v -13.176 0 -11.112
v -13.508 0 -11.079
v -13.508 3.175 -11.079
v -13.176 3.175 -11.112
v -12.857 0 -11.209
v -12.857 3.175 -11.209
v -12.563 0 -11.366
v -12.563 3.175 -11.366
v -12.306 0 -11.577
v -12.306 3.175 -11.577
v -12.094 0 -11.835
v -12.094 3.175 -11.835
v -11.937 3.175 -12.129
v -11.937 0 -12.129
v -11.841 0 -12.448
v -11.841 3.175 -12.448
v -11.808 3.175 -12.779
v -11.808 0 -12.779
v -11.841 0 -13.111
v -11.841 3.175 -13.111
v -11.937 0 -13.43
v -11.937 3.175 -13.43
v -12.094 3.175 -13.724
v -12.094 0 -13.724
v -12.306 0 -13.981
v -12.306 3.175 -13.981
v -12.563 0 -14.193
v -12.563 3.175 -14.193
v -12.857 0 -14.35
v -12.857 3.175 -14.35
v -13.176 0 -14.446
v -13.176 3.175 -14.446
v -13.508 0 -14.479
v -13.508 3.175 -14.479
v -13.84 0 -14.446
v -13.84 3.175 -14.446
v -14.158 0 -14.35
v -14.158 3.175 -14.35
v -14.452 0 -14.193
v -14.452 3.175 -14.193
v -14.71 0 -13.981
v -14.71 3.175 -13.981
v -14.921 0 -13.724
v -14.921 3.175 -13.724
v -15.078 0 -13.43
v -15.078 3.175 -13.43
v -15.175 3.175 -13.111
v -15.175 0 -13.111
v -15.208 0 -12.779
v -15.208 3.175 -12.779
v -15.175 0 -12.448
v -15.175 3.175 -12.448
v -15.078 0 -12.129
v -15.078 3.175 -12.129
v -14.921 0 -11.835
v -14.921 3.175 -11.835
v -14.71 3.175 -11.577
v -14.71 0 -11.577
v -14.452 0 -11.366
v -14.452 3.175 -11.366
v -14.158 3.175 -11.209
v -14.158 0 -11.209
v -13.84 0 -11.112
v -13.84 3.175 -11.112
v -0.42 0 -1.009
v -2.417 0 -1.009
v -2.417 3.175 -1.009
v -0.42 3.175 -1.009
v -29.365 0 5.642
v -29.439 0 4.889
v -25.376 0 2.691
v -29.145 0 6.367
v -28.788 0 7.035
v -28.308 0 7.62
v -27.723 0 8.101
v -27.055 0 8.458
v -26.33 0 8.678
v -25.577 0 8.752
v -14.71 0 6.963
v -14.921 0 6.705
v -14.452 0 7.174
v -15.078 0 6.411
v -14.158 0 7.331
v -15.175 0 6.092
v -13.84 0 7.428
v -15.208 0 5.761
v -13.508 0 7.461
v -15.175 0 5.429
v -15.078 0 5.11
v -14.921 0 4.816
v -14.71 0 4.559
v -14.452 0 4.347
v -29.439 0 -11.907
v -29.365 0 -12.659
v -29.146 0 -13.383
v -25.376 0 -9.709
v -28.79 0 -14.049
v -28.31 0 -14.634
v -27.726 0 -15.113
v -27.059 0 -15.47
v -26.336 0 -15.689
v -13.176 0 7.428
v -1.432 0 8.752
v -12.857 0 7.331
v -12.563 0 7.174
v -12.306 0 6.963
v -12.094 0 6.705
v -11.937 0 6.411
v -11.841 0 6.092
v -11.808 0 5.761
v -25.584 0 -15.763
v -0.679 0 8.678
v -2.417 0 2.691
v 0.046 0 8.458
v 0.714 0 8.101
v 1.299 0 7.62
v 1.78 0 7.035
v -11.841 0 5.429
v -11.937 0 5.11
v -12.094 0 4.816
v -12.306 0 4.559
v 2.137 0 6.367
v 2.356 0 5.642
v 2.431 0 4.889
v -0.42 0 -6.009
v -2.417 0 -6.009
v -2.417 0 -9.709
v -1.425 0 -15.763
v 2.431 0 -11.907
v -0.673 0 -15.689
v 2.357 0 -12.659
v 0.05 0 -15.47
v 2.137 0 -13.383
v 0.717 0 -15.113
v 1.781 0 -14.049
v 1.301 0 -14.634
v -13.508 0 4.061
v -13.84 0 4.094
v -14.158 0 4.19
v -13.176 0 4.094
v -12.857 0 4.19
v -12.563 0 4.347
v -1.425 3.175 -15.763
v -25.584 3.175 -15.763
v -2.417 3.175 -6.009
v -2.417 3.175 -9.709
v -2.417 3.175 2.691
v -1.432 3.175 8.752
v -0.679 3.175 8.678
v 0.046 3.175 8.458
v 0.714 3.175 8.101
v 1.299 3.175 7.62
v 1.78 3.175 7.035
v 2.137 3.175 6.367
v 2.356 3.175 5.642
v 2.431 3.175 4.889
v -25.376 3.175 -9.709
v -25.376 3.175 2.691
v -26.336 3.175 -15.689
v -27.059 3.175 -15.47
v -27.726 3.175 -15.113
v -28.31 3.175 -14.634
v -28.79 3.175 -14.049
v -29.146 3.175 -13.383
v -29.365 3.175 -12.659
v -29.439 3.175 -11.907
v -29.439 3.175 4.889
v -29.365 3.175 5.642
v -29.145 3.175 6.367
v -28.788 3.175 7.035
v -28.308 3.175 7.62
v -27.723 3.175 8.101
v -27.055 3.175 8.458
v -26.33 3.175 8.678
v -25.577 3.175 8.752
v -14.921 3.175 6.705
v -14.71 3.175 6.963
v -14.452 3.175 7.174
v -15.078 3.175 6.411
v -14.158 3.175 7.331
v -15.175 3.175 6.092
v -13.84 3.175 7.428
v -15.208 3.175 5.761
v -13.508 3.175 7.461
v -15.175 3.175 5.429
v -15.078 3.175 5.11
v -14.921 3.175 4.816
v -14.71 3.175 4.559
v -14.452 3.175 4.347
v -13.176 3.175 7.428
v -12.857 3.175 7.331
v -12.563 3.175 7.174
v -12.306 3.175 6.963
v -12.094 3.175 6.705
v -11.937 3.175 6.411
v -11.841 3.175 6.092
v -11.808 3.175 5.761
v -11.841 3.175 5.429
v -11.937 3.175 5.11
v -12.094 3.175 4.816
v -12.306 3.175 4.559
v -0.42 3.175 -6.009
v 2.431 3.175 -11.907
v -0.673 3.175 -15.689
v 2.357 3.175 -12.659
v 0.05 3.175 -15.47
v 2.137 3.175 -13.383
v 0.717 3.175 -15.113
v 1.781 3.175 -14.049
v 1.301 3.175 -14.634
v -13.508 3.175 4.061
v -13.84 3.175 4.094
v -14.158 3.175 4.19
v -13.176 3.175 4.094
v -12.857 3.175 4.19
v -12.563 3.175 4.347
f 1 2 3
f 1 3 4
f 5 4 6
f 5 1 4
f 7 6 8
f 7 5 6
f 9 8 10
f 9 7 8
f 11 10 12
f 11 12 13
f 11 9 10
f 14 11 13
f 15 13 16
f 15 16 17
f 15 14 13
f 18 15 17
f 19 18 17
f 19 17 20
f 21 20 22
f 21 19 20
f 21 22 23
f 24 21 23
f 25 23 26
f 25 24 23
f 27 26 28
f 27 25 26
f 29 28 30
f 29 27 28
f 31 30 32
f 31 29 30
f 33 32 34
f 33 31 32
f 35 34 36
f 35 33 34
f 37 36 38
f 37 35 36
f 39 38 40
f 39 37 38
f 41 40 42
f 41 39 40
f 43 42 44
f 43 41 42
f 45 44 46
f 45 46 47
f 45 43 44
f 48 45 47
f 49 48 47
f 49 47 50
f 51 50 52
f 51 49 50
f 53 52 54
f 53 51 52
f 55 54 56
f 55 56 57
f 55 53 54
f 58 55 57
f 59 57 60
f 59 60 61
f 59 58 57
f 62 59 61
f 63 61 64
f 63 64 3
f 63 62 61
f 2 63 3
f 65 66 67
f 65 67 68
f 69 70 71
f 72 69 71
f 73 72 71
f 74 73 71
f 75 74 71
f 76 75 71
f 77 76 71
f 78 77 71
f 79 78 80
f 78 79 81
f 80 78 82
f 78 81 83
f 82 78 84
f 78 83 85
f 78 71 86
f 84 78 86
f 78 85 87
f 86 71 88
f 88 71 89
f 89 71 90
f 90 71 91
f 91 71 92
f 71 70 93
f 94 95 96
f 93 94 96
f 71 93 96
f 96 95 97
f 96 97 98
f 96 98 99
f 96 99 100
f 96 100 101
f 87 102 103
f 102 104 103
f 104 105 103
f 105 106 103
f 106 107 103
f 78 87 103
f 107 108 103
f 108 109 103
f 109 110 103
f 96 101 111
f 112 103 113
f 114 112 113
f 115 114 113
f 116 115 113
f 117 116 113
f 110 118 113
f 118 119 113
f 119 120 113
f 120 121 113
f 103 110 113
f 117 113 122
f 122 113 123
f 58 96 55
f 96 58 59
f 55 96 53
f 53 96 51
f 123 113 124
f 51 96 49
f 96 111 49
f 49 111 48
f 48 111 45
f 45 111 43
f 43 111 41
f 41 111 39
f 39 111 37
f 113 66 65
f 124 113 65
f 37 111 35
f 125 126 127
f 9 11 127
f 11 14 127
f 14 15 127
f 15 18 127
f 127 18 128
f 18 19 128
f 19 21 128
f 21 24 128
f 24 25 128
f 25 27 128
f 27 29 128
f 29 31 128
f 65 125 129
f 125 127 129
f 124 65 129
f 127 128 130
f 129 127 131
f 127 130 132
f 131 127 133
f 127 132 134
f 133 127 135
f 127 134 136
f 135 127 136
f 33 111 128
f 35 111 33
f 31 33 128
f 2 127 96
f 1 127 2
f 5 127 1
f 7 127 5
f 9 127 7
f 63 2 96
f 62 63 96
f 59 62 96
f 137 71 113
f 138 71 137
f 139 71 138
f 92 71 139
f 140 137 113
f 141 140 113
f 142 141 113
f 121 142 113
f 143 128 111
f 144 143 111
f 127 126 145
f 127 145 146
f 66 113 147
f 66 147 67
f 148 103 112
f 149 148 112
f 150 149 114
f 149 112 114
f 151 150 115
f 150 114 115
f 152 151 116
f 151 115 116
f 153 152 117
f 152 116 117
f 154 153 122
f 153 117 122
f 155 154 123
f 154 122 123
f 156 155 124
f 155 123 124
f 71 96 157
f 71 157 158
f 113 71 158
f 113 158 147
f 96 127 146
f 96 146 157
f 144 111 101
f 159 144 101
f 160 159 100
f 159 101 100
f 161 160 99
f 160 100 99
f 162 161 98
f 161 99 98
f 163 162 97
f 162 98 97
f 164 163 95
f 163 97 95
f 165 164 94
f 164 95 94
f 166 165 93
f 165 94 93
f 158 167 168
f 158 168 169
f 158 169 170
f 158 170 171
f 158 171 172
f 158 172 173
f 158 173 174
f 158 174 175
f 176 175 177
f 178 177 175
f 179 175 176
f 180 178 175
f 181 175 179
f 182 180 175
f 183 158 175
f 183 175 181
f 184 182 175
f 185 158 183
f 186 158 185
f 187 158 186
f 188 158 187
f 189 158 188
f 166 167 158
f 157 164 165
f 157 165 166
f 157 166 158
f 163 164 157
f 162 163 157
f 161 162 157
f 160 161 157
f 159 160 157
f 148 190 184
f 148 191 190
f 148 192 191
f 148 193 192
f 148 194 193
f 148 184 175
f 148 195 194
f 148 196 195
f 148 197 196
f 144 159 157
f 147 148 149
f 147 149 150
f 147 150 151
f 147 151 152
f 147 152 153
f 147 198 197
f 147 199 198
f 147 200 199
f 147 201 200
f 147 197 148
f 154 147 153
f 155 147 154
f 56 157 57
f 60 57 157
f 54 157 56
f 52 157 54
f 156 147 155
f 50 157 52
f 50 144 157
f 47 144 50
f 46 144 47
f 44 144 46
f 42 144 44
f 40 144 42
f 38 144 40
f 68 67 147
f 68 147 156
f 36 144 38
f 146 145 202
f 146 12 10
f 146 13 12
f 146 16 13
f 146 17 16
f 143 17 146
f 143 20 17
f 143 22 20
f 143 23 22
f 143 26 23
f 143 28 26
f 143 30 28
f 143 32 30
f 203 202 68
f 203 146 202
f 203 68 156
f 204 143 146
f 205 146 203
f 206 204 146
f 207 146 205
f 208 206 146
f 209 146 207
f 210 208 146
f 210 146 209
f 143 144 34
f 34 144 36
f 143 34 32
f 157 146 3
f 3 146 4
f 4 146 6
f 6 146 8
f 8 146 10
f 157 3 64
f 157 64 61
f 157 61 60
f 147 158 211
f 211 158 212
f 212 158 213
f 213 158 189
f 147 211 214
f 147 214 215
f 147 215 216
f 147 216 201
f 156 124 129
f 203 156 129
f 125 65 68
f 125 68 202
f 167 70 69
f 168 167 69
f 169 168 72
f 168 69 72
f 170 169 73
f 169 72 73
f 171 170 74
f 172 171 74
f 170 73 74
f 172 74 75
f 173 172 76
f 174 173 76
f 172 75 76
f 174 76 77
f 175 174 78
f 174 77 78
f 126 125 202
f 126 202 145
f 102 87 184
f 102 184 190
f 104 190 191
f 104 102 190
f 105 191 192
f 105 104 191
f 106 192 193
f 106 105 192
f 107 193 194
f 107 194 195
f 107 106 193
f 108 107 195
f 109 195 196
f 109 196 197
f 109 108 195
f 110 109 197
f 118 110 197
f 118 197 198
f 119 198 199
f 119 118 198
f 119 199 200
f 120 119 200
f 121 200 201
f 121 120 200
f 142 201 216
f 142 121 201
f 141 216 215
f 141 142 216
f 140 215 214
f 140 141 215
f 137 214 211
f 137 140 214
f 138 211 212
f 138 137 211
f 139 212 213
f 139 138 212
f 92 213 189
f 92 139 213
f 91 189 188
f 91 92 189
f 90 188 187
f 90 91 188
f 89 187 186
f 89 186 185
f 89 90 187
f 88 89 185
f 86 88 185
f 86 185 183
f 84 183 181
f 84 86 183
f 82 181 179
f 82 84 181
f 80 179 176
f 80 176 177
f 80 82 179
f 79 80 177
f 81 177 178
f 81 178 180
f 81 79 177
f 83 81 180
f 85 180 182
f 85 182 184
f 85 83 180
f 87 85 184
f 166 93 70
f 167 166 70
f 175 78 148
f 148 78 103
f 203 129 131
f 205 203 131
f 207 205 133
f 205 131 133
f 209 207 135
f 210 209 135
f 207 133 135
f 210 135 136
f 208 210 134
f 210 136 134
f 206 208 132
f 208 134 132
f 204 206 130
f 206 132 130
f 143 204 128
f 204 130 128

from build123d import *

# Parameters (mm, degrees)
SKETCH1_R           = 1.700000029
BOSS_EXTRUDE1_DEPTH = 3.175


with BuildPart() as part:
    # Sketch1 → Boss-Extrude1 (new body)
    with BuildSketch(Plane(origin=(0, 0, 0), x_dir=(1, 0, 0), z_dir=(0, 1, 0))):
        with BuildLine():
            Line((-1.425196706, 15.763070025), (-25.583614521, 15.763070025))
            ThreePointArc((-25.583614521, 15.763070025), (-28.310130326, 14.633710201), (-29.439490151, 11.907194396))
            Line((-29.439490151, 11.907194396), (-29.439490151, -4.88887146))
            ThreePointArc((-29.439490151, -4.88887146), (-28.308084251, -7.620326926), (-25.576628785, -8.751732825))
            Line((-25.576628785, -8.751732825), (-1.432182442, -8.751732825))
            ThreePointArc((-1.432182442, -8.751732825), (1.299273025, -7.620326926), (2.430678924, -4.88887146))
            Line((2.430678924, -4.88887146), (2.430678924, 11.907194396))
            ThreePointArc((2.430678924, 11.907194396), (1.301319099, 14.633710201), (-1.425196706, 15.763070025))
        make_face()
        with Locations(Location((-13.507869129, 12.77916147, 0), (0, 0, 270))):
            Circle(SKETCH1_R, mode=Mode.SUBTRACT)
        with Locations(Location((-13.507869129, -5.760838534, 0), (0, 0, 270))):
            Circle(SKETCH1_R, mode=Mode.SUBTRACT)
        Polygon((-2.416750389, 9.709339568), (-25.375916231, 9.709339568), (-25.375916231, -2.691010202), (-2.416750389, -2.691010202), (-2.416750389, 1.009089439), (-0.420102398, 1.009089439), (-0.420102398, 6.009239927), (-2.416750389, 6.009239927), align=None, mode=Mode.SUBTRACT)
    extrude(amount=BOSS_EXTRUDE1_DEPTH)


solid = part.part
